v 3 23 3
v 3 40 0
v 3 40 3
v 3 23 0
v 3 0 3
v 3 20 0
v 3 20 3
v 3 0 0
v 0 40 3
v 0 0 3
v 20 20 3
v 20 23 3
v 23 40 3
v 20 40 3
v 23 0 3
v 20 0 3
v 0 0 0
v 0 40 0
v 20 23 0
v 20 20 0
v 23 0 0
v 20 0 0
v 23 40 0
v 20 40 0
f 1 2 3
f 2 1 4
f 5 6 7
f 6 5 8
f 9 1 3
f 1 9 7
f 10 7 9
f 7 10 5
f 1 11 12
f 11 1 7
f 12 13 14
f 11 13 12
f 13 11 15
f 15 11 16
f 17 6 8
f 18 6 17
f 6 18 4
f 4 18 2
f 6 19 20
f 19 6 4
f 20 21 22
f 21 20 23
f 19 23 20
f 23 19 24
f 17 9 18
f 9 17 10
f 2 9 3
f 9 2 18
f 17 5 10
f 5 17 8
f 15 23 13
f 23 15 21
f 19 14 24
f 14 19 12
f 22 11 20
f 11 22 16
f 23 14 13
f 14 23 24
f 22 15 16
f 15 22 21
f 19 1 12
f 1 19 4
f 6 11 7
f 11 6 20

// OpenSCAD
union(){
 cube([3,40,3]);
 translate([20,0,0]) cube([3,40,3]);
 translate([0,20,0]) cube([20,3,3]);
}
